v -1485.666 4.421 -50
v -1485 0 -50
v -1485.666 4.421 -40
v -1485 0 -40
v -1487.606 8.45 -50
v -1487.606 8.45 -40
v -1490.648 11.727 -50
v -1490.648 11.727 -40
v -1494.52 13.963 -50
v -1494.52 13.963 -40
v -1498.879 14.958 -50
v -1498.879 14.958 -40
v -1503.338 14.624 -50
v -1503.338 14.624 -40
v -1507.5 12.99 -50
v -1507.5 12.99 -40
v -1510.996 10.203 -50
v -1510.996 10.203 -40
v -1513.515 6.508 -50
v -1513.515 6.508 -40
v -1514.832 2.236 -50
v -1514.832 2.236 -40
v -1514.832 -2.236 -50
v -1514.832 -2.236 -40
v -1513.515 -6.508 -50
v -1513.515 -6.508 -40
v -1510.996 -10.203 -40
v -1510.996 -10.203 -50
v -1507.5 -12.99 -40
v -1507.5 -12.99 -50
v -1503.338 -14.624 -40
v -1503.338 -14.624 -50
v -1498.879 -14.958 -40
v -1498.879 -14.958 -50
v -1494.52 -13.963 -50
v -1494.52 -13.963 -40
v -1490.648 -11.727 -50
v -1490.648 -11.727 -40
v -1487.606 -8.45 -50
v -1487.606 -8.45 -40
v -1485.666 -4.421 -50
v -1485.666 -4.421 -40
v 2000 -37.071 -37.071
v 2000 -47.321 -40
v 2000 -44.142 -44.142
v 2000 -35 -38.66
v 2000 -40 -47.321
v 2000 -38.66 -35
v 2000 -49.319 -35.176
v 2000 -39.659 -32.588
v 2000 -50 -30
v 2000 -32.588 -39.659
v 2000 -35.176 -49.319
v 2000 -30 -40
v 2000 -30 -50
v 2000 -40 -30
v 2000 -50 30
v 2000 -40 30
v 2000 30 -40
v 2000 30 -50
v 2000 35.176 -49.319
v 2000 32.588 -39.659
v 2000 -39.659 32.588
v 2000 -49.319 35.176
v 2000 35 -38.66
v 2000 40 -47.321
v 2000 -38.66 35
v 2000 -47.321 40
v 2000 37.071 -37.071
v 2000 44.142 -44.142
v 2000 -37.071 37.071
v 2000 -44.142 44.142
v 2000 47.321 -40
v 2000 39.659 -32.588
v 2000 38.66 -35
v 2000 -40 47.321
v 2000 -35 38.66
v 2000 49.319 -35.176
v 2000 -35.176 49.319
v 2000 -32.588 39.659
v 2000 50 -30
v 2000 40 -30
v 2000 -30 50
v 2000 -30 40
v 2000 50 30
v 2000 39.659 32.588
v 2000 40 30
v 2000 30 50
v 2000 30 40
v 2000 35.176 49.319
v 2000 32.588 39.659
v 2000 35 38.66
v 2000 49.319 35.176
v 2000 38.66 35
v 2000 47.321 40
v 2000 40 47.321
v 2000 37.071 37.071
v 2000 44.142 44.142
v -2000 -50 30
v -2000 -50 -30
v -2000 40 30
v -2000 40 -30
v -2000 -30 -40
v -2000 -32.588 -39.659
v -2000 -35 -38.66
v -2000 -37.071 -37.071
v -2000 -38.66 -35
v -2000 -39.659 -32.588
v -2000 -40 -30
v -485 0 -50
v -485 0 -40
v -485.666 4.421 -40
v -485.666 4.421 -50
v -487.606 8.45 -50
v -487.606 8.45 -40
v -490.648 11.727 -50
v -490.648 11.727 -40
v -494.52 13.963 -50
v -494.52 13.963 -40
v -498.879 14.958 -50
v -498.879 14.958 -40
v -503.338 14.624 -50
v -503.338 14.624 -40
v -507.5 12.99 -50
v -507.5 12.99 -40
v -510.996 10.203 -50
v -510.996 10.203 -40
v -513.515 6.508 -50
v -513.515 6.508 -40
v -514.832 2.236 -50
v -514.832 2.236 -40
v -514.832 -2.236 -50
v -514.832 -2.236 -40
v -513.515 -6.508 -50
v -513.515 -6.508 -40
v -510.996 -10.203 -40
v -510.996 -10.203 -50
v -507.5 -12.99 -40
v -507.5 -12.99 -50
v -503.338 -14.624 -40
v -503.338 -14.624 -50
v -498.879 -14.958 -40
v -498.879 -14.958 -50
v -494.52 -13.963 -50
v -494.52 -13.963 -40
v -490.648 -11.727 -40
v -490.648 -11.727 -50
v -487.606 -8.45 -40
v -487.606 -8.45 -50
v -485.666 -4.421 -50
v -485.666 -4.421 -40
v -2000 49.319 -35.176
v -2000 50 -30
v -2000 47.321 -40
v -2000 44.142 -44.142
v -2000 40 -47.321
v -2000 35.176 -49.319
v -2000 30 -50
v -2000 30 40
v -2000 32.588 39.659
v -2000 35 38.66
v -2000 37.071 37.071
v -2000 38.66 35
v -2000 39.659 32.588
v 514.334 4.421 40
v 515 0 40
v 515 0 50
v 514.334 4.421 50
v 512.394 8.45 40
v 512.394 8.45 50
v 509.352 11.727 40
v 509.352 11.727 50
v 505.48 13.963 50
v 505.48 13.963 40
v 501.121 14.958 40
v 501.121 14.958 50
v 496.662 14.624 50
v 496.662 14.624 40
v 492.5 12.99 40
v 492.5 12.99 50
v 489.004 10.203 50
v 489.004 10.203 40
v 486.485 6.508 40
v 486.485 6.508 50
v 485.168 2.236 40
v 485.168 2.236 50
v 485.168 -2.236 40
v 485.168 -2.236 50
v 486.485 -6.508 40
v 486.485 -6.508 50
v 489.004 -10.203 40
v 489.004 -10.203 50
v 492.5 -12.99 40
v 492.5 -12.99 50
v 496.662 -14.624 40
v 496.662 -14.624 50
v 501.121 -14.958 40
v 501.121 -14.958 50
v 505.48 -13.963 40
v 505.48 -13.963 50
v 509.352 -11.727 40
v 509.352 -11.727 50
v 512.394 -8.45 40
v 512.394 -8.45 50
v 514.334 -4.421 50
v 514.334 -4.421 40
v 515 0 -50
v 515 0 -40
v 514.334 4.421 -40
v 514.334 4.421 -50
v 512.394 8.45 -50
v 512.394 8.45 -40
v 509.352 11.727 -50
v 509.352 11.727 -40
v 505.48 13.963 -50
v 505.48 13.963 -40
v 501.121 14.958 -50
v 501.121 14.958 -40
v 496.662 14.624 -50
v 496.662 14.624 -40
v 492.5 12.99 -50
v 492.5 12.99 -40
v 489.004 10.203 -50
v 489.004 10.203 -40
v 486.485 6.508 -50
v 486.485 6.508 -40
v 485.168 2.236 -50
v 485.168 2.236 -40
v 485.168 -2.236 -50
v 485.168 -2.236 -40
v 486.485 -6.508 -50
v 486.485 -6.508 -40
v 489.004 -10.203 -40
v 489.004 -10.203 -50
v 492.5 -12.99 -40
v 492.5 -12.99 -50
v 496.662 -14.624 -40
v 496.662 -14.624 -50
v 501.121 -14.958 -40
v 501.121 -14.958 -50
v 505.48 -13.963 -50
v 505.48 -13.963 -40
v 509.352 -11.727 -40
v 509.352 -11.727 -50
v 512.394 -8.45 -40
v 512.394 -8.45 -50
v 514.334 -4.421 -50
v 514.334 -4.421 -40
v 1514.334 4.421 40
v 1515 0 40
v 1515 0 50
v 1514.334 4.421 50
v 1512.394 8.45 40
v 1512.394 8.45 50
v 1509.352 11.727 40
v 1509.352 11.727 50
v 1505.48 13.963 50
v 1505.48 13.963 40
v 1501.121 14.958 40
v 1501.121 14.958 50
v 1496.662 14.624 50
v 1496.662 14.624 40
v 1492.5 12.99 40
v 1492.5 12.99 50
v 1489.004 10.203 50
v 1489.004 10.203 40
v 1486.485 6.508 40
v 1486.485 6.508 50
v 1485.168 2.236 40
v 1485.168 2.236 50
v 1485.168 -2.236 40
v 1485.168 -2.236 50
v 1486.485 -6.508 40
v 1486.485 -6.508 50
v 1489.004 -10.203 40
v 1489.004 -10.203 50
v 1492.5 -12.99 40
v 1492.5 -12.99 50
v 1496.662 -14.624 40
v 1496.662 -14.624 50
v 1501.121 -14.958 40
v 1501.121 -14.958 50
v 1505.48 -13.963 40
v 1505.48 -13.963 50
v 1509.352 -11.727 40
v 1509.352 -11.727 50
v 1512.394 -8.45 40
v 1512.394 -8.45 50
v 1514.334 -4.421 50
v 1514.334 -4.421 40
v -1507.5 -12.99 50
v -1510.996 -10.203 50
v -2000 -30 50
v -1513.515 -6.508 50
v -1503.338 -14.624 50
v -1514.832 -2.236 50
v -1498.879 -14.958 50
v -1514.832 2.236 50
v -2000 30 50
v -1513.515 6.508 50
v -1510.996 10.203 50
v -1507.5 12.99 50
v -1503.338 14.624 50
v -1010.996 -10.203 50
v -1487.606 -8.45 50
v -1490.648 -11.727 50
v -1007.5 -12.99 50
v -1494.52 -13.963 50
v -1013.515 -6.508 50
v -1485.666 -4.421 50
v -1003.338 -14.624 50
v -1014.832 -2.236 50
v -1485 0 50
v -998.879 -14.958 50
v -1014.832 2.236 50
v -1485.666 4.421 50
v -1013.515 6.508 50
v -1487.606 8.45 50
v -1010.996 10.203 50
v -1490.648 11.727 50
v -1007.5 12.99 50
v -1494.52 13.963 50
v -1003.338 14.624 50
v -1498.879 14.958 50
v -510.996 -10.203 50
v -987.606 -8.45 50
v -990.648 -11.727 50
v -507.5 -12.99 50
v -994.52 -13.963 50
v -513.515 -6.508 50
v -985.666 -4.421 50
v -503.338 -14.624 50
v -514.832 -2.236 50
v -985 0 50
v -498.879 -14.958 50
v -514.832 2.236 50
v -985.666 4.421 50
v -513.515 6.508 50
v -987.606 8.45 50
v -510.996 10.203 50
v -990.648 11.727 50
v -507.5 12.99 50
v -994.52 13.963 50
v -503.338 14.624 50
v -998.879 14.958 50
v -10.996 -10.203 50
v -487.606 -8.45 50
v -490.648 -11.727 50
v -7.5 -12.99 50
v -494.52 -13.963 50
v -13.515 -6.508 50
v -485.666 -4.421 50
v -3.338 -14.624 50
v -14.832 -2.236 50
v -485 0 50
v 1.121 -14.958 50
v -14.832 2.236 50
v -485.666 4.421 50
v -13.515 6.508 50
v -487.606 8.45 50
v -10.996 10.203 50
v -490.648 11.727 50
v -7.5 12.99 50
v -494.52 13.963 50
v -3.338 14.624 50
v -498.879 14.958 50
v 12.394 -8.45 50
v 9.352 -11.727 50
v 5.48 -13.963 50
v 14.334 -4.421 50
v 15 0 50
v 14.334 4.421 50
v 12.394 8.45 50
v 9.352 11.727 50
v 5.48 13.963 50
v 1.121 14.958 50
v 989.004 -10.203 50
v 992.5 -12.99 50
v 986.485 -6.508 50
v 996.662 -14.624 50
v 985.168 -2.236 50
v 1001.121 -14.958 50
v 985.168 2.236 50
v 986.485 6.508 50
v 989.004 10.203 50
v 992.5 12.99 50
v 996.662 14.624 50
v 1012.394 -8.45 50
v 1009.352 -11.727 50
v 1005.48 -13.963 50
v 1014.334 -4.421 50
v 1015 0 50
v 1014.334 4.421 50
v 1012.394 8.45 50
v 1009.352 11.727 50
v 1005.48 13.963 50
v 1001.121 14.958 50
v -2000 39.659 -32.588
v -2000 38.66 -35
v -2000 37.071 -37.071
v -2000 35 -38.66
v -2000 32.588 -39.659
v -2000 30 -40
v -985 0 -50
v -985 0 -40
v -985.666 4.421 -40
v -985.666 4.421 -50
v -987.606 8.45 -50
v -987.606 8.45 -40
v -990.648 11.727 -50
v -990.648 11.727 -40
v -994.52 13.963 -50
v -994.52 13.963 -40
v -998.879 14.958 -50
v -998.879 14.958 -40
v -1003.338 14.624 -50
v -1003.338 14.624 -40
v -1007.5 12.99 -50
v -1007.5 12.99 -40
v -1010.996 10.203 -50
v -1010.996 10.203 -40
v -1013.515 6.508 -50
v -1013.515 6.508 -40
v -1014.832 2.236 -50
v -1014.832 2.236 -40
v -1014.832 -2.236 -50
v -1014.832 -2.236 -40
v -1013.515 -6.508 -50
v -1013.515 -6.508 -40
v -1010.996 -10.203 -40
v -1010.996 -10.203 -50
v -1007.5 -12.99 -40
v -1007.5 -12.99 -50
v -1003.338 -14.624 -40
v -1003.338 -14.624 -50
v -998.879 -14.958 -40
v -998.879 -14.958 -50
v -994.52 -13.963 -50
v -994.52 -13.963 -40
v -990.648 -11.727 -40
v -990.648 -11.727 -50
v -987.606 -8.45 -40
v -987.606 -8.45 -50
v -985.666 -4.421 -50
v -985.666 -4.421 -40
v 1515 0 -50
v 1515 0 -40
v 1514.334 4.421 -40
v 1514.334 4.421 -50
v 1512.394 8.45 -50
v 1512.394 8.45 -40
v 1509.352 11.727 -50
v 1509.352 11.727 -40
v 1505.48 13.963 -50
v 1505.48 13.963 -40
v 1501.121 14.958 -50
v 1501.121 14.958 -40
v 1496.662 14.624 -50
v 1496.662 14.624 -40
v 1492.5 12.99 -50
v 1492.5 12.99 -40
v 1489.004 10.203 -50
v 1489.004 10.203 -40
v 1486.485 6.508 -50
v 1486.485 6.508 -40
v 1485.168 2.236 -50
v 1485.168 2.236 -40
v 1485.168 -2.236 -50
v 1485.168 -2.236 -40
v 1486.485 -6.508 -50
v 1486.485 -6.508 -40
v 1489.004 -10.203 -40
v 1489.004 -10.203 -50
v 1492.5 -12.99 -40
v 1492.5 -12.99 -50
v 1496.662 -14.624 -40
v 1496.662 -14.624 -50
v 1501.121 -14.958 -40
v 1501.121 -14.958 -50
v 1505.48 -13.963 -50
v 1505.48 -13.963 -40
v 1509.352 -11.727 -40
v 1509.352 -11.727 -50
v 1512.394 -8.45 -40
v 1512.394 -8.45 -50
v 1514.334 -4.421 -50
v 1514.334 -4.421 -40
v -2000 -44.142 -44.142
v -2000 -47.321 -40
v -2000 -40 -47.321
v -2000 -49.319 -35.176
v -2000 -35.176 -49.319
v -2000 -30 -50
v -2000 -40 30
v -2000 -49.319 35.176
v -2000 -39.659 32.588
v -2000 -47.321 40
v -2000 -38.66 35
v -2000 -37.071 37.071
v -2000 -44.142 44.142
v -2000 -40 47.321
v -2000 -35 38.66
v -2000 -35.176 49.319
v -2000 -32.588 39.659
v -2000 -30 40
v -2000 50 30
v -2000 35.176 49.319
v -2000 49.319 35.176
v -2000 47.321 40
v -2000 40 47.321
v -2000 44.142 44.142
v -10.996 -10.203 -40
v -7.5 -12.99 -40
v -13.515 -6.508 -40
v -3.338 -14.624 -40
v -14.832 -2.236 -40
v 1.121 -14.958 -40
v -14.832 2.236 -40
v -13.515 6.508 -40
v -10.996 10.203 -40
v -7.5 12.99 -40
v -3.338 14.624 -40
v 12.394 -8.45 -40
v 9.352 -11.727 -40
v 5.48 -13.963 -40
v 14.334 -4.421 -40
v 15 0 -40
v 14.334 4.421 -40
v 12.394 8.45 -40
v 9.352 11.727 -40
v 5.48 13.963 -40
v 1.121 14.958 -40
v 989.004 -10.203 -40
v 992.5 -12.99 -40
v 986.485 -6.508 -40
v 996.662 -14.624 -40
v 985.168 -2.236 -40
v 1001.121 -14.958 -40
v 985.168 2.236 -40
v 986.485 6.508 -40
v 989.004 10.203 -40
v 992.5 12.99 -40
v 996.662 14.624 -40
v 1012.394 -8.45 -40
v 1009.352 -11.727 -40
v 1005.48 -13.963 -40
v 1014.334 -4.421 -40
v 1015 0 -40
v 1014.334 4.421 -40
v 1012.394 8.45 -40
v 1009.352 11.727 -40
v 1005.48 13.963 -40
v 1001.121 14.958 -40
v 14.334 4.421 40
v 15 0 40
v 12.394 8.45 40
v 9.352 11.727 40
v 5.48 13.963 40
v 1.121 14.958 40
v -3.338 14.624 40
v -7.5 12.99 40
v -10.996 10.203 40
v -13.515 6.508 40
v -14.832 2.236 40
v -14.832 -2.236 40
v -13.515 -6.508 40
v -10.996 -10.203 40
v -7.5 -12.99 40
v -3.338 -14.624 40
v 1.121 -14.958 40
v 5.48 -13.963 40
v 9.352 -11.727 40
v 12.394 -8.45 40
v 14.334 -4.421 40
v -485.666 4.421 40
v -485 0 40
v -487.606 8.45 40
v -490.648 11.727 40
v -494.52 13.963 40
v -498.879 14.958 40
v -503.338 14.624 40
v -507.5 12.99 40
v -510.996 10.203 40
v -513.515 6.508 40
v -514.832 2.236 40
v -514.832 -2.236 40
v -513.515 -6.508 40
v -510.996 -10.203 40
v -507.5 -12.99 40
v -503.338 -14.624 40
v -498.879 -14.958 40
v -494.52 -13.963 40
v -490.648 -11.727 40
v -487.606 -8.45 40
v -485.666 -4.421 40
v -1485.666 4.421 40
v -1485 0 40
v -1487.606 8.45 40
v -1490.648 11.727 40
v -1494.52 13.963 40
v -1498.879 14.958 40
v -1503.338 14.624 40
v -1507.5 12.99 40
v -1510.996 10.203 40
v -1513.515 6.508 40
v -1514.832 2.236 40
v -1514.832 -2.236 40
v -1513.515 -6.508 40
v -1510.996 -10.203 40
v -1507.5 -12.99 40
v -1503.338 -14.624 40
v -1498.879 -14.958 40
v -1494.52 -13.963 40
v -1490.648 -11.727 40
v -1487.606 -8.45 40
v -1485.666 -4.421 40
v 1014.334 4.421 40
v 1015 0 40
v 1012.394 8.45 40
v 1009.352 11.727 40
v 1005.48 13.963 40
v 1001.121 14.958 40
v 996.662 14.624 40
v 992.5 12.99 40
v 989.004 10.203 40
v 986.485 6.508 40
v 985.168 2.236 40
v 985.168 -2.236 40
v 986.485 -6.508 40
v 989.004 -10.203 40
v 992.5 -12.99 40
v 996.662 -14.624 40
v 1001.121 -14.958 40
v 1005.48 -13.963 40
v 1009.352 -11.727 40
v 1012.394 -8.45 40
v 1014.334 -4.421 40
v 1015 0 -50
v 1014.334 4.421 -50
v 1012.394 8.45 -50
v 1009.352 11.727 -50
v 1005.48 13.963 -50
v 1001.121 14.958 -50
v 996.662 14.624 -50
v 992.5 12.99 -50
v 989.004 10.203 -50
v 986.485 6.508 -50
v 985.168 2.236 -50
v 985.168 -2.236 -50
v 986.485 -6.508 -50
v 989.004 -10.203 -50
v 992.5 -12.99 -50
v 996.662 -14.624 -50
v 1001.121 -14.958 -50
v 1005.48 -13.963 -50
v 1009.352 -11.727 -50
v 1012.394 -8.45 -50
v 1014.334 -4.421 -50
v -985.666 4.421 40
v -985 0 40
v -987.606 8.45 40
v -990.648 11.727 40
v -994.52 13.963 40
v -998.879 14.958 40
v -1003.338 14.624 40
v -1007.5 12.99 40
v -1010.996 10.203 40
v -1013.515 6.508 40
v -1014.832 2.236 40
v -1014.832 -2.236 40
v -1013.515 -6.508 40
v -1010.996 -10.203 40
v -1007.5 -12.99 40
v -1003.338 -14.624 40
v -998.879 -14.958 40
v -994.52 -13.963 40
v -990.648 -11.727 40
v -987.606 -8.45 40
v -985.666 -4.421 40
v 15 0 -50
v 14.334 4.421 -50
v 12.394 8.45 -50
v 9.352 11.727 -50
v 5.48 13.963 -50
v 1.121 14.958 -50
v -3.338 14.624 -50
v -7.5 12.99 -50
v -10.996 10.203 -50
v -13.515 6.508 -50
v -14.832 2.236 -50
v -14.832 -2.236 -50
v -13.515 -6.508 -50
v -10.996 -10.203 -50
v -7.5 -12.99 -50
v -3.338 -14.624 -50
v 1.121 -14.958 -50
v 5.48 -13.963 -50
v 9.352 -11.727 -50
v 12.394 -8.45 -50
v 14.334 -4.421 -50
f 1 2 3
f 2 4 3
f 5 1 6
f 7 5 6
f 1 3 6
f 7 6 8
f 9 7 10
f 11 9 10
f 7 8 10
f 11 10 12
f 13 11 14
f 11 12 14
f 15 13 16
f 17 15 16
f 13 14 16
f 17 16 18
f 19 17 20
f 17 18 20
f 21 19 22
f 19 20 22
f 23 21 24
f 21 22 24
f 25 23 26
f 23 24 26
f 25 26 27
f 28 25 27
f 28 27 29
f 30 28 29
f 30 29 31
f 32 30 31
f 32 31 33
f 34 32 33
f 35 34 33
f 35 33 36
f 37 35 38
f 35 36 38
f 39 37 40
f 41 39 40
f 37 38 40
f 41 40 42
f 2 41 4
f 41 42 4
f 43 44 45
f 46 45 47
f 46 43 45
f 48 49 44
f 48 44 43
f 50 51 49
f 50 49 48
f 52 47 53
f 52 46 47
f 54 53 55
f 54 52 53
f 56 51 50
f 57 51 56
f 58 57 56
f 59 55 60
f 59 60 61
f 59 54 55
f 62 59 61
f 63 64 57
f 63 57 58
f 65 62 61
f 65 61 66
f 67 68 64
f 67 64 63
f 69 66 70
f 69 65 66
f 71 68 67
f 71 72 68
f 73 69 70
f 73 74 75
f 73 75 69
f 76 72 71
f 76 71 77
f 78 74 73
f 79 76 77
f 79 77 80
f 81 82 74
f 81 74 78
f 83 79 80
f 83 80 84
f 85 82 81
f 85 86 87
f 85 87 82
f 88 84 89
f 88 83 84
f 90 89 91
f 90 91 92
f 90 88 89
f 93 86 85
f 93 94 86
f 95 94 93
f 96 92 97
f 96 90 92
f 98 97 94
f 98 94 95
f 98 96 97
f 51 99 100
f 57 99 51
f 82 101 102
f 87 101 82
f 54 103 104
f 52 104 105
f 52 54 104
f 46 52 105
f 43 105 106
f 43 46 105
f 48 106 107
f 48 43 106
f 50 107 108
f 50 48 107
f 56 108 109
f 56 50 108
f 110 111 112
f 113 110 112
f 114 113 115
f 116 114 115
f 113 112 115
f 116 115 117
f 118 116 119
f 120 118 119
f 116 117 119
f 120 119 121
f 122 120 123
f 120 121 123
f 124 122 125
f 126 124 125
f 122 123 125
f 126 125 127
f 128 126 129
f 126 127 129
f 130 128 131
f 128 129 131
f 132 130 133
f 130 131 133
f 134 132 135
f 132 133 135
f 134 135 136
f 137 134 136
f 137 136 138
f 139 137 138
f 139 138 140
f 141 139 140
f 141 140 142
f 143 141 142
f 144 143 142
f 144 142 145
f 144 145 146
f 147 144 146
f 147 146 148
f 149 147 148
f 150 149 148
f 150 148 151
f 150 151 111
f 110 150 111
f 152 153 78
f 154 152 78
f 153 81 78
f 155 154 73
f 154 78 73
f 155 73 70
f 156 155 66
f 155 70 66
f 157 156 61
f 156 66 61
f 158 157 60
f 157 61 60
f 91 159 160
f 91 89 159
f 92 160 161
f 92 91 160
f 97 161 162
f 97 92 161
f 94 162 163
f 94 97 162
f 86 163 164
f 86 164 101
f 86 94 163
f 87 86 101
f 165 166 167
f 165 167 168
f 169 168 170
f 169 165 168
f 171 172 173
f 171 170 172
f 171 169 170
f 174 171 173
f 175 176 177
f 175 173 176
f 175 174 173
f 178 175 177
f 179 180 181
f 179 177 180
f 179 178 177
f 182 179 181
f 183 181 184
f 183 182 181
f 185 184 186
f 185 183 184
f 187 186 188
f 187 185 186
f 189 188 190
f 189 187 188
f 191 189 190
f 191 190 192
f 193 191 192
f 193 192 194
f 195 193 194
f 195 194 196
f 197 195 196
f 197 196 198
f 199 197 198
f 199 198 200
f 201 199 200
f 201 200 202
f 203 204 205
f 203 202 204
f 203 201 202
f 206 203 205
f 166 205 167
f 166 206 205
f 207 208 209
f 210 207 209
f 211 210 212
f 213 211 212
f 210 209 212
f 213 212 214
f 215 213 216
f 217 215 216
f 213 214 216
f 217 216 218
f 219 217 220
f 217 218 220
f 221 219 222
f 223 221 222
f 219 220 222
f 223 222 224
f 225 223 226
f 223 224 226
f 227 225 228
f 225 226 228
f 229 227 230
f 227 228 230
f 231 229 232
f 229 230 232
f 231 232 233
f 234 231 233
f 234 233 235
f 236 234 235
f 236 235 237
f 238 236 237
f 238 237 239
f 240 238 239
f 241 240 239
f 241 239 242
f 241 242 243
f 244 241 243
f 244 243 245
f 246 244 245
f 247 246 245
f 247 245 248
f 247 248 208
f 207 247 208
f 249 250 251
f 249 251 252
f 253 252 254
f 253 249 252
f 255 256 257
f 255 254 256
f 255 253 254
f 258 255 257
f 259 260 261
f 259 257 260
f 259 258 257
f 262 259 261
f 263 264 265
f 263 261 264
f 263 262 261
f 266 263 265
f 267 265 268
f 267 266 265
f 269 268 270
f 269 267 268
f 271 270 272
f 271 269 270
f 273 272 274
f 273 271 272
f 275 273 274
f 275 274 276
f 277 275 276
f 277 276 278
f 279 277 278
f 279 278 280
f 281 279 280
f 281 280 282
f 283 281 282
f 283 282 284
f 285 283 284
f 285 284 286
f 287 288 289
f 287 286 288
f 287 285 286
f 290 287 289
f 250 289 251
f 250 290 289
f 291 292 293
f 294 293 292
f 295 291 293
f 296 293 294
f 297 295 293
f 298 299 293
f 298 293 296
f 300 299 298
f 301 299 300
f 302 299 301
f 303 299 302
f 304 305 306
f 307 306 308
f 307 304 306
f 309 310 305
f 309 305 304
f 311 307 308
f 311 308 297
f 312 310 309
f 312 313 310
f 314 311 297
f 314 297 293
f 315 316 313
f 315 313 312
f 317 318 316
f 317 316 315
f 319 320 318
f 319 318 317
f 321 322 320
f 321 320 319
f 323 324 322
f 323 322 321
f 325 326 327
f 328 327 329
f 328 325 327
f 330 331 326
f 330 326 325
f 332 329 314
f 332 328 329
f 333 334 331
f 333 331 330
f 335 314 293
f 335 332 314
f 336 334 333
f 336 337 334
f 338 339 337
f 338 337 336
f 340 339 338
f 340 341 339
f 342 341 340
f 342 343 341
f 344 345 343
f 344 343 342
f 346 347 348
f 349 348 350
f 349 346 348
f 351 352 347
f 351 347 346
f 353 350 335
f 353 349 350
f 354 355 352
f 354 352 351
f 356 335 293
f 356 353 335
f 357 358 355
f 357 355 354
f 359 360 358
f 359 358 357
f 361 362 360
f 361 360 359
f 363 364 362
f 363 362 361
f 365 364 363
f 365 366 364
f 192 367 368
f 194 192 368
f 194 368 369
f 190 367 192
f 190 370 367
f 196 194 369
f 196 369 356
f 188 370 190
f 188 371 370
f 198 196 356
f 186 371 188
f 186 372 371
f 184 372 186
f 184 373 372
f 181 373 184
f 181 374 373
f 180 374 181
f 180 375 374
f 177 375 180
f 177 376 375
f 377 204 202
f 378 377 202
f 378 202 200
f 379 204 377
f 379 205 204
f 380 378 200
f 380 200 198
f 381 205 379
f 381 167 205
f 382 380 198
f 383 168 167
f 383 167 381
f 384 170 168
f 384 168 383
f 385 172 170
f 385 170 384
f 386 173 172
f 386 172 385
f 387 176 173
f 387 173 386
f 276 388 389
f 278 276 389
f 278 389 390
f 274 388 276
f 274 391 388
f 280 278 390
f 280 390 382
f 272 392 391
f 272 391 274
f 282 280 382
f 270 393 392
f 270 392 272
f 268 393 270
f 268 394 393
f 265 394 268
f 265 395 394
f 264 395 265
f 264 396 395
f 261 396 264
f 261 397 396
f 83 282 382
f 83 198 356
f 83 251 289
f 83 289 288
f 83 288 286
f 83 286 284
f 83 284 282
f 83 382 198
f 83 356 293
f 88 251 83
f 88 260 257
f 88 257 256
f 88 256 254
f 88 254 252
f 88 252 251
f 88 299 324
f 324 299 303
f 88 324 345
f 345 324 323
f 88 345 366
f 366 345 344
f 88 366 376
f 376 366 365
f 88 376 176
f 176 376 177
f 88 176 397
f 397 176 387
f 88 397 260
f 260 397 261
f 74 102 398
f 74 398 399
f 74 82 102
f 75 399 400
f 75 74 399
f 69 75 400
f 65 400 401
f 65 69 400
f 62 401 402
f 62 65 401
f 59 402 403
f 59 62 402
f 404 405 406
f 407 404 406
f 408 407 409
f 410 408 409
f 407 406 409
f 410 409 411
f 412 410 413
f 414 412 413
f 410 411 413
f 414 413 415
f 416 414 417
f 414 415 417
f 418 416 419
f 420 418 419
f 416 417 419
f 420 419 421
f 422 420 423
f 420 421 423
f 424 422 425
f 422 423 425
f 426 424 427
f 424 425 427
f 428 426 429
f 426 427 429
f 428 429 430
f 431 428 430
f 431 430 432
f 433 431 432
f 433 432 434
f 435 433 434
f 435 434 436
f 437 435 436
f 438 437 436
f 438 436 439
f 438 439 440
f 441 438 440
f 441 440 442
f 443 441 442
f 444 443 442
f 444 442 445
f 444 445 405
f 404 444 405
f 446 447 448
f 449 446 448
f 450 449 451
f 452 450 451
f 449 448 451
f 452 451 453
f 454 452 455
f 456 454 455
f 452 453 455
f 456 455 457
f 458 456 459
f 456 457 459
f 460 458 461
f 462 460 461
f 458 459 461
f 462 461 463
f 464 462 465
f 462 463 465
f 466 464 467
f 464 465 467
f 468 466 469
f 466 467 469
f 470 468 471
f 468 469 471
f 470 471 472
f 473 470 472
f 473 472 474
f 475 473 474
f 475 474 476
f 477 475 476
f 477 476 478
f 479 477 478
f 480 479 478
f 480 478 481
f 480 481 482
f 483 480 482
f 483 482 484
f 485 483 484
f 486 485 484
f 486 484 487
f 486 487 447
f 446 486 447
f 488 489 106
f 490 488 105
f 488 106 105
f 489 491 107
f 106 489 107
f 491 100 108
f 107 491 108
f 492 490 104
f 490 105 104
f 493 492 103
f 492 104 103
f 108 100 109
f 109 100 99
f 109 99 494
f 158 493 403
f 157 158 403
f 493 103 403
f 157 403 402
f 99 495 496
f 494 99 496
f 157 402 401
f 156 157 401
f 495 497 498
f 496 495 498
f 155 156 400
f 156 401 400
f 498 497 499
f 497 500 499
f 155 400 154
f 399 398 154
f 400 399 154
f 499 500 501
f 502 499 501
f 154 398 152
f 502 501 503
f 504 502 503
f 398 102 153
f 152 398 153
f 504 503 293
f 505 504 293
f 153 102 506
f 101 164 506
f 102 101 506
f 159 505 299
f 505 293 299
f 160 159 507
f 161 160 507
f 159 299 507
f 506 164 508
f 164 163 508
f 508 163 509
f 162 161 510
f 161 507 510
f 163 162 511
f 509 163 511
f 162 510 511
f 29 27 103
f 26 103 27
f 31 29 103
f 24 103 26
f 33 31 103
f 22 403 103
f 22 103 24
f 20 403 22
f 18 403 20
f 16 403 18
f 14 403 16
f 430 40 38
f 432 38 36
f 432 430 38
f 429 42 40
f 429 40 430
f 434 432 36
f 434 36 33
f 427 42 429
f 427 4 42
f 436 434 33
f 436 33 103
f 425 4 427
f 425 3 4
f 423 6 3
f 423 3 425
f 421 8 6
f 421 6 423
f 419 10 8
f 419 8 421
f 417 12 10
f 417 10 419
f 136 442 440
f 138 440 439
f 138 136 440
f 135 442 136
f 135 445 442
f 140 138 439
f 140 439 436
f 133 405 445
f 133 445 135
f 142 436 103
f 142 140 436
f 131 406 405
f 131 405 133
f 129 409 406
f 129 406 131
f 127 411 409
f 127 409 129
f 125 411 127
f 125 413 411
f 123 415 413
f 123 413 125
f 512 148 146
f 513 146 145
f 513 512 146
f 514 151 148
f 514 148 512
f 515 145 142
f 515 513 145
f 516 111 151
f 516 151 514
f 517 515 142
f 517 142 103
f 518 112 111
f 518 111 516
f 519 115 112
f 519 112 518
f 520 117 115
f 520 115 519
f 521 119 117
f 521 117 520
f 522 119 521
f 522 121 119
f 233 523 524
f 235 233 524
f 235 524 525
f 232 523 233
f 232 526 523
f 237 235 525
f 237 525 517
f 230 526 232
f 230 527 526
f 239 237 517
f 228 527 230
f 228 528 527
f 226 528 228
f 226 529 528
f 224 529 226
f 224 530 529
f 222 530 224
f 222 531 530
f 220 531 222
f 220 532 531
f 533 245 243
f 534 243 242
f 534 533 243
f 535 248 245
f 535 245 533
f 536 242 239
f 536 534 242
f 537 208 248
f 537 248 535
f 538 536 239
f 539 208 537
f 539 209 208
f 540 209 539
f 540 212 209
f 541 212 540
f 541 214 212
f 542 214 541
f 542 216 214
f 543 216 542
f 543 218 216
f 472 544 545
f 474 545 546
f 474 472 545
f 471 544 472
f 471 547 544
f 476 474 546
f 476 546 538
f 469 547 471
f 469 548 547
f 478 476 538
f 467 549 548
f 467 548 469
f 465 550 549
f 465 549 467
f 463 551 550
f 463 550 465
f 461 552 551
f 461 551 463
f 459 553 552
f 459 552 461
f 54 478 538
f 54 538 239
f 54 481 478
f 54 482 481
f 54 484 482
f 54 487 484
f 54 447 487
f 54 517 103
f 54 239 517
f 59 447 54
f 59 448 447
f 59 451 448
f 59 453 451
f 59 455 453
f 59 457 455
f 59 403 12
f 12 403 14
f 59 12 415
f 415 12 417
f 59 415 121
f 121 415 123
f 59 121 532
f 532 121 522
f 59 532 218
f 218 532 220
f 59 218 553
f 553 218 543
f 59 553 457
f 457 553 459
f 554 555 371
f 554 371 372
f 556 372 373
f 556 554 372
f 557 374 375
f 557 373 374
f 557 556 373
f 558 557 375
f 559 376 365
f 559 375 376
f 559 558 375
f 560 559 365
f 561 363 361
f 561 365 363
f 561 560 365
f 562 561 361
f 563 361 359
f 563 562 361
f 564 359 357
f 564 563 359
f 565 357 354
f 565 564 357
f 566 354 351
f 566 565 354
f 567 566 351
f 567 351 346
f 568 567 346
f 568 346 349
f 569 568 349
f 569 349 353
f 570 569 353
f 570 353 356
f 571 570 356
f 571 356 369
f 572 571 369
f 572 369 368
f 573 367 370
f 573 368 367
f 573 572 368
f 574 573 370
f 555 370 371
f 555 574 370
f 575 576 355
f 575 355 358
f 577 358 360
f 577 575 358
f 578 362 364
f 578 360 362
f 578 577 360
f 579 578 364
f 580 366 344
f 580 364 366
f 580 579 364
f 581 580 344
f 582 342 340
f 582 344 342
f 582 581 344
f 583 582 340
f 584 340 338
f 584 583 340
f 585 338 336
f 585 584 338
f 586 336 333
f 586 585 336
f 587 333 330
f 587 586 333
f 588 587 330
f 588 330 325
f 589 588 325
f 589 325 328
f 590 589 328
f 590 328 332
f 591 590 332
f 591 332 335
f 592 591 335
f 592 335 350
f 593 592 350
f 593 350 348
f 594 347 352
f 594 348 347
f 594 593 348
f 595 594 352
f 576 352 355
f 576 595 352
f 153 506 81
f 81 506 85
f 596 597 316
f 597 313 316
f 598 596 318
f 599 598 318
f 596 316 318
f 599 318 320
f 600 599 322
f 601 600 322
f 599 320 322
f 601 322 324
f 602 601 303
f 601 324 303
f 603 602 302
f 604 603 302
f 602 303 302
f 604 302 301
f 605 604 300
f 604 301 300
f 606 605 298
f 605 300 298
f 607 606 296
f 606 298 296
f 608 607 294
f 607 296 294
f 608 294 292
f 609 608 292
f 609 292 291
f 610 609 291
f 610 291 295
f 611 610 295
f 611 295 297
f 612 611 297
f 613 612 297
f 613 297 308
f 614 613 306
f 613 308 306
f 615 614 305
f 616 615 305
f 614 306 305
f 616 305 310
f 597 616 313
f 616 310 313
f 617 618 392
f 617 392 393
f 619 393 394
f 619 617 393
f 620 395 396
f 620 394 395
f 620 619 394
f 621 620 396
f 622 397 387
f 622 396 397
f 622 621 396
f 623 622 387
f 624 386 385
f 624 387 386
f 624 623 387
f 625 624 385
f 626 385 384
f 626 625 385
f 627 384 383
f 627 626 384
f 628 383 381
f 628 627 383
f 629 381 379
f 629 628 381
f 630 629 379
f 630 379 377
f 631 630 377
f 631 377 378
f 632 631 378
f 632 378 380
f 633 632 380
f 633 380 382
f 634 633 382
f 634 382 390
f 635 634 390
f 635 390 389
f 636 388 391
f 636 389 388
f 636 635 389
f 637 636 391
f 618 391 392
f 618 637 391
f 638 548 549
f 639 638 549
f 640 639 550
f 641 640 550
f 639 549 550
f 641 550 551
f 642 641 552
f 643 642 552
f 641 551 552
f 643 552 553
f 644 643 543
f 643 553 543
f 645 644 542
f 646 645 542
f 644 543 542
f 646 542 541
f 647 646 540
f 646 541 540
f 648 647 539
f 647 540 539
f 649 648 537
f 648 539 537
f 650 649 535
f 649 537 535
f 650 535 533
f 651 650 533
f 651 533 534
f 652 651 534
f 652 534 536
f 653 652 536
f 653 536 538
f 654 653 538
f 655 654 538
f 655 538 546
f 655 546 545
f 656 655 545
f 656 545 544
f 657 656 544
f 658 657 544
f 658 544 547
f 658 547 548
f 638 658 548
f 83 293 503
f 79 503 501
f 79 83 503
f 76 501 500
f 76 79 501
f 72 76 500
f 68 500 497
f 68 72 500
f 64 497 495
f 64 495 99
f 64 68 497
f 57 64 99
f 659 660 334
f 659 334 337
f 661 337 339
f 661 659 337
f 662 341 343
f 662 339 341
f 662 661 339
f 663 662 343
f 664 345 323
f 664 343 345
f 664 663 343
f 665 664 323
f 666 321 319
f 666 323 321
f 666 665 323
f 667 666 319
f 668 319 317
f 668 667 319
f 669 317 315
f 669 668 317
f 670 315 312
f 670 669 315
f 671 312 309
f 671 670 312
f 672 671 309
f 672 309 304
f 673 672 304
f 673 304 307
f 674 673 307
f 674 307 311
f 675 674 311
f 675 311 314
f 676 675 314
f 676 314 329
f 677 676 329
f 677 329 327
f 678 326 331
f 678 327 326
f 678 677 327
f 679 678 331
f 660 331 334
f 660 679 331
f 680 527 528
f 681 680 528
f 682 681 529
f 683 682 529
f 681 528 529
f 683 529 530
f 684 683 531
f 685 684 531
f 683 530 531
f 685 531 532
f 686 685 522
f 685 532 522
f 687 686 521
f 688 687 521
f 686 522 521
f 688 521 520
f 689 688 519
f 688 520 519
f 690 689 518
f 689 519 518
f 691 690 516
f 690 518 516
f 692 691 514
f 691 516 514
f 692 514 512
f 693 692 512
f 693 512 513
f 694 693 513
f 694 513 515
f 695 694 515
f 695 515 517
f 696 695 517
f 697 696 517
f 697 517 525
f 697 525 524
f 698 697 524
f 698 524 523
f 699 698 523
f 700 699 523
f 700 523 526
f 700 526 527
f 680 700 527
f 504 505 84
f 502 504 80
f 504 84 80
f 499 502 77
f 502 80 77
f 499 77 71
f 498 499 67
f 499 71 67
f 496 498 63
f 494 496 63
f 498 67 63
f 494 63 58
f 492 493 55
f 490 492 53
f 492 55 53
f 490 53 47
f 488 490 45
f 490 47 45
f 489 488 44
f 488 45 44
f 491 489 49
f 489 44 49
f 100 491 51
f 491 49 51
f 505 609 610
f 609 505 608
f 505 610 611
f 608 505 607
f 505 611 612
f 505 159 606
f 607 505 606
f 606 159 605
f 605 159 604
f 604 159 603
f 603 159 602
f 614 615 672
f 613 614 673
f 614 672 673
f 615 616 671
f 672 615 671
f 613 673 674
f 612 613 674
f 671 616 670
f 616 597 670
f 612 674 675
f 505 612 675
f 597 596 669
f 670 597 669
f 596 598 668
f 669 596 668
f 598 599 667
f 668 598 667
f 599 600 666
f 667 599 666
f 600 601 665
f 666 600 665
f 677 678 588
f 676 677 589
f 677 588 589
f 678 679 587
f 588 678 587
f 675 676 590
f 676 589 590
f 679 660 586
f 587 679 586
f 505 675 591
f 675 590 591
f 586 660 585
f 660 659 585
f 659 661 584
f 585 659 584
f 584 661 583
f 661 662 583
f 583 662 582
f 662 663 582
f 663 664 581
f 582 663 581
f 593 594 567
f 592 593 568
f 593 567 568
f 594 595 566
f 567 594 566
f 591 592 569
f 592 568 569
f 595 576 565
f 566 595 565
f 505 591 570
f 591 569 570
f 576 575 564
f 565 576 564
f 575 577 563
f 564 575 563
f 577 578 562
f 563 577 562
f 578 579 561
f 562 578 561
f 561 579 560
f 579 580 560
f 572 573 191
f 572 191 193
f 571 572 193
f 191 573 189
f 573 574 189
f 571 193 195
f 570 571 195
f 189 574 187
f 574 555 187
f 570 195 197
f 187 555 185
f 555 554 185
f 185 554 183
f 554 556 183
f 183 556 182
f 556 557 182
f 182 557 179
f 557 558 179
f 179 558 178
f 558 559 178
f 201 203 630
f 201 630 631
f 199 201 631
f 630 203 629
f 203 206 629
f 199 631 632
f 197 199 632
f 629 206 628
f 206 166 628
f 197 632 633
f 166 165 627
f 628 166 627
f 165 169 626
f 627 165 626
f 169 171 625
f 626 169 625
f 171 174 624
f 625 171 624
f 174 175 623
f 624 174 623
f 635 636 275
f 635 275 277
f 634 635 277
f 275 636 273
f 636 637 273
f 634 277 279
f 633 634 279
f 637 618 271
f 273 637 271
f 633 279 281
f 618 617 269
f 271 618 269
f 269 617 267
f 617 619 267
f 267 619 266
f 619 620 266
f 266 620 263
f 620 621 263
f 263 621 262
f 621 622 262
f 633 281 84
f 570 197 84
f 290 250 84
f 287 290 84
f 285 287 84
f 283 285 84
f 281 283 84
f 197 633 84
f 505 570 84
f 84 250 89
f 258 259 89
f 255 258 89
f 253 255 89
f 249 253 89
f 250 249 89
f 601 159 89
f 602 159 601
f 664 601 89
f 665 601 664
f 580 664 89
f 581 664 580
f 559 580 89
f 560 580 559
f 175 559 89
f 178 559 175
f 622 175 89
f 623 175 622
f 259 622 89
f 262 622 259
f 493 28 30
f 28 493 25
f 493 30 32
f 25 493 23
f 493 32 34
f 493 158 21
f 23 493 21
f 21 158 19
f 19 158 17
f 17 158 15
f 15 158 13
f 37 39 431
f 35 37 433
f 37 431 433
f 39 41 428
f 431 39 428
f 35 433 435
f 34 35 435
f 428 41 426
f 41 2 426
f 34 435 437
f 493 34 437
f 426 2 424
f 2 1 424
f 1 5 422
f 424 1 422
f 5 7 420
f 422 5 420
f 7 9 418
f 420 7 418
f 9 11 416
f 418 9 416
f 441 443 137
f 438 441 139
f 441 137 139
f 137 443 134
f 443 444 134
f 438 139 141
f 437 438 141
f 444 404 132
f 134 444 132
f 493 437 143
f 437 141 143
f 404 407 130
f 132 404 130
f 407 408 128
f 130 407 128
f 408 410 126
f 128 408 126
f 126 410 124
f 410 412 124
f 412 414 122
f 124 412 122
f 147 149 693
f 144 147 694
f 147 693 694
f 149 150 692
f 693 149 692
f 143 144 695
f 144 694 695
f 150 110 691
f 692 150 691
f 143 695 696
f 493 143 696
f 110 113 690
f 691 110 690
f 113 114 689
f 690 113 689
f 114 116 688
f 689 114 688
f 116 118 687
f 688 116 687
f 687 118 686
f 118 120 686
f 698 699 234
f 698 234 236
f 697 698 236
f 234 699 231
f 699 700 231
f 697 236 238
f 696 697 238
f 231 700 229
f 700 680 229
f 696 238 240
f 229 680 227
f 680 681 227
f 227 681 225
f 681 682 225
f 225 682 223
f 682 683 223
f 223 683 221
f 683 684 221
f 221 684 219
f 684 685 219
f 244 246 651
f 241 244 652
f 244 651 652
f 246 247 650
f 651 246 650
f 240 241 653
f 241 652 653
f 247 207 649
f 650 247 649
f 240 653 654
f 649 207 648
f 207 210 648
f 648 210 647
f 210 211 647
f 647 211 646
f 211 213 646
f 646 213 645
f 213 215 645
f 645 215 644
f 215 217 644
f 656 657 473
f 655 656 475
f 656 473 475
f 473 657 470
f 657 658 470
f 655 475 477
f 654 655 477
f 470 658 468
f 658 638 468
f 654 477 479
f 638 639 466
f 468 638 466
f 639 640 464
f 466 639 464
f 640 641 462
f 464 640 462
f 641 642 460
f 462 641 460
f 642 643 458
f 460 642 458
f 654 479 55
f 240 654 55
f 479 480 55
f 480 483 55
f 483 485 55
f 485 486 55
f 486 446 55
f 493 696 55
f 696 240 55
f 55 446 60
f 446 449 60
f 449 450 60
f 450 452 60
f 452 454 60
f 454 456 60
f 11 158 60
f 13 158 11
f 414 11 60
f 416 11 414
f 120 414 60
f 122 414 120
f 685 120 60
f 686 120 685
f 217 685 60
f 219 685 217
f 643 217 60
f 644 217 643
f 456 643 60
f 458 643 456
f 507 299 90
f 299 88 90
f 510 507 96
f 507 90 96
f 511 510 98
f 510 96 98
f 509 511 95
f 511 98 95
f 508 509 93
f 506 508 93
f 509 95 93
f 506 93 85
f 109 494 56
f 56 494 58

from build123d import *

# Parameters (mm, degrees)
F0_W     = 4000
F0_H     = 100
F1_DEPTH = 50
F2_R     = 20
F3_T     = -10
F5_R     = 15
F6_DEPTH = 250


with BuildPart() as f1:
    # F0 (on Top) → F1 (new body, symmetric)
    with BuildSketch(Plane.XY):
        Rectangle(F0_W, F0_H)
    extrude(amount=F1_DEPTH, both=True)

    # F2
    f2_edges = [f1.edges().sort_by_distance(p)[0] for p in [
        (0, 50, 50),
        (0, -50, -50),
        (0, -50, 50),
        (0, 50, -50),
    ]]
    fillet(f2_edges, radius=F2_R)

    # F3
    f3_openings = [f1.faces().sort_by_distance(p)[0] for p in [
        (2000, 0, 0),
        (-2000, 0, 0),
    ]]
    offset(amount=F3_T, openings=f3_openings)

    # F4: F1 across plane


with BuildPart() as f1_1:
    add(f1.part)
    add(f1.part.mirror(Plane.YZ))

    # F5 (on Top) → F6 (cut, symmetric)
    with BuildSketch(Plane.XY):
        Circle(F5_R)
        with Locations((500, 0)):
            Circle(F5_R)
        with Locations((1000, 0)):
            Circle(F5_R)
        with Locations((1500, 0)):
            Circle(F5_R)
        with Locations((-500, 0)):
            Circle(F5_R)
        with Locations((-1000, 0)):
            Circle(F5_R)
        with Locations((-1500, 0)):
            Circle(F5_R)
    extrude(amount=F6_DEPTH, both=True, mode=Mode.SUBTRACT)


solid = f1_1.part
